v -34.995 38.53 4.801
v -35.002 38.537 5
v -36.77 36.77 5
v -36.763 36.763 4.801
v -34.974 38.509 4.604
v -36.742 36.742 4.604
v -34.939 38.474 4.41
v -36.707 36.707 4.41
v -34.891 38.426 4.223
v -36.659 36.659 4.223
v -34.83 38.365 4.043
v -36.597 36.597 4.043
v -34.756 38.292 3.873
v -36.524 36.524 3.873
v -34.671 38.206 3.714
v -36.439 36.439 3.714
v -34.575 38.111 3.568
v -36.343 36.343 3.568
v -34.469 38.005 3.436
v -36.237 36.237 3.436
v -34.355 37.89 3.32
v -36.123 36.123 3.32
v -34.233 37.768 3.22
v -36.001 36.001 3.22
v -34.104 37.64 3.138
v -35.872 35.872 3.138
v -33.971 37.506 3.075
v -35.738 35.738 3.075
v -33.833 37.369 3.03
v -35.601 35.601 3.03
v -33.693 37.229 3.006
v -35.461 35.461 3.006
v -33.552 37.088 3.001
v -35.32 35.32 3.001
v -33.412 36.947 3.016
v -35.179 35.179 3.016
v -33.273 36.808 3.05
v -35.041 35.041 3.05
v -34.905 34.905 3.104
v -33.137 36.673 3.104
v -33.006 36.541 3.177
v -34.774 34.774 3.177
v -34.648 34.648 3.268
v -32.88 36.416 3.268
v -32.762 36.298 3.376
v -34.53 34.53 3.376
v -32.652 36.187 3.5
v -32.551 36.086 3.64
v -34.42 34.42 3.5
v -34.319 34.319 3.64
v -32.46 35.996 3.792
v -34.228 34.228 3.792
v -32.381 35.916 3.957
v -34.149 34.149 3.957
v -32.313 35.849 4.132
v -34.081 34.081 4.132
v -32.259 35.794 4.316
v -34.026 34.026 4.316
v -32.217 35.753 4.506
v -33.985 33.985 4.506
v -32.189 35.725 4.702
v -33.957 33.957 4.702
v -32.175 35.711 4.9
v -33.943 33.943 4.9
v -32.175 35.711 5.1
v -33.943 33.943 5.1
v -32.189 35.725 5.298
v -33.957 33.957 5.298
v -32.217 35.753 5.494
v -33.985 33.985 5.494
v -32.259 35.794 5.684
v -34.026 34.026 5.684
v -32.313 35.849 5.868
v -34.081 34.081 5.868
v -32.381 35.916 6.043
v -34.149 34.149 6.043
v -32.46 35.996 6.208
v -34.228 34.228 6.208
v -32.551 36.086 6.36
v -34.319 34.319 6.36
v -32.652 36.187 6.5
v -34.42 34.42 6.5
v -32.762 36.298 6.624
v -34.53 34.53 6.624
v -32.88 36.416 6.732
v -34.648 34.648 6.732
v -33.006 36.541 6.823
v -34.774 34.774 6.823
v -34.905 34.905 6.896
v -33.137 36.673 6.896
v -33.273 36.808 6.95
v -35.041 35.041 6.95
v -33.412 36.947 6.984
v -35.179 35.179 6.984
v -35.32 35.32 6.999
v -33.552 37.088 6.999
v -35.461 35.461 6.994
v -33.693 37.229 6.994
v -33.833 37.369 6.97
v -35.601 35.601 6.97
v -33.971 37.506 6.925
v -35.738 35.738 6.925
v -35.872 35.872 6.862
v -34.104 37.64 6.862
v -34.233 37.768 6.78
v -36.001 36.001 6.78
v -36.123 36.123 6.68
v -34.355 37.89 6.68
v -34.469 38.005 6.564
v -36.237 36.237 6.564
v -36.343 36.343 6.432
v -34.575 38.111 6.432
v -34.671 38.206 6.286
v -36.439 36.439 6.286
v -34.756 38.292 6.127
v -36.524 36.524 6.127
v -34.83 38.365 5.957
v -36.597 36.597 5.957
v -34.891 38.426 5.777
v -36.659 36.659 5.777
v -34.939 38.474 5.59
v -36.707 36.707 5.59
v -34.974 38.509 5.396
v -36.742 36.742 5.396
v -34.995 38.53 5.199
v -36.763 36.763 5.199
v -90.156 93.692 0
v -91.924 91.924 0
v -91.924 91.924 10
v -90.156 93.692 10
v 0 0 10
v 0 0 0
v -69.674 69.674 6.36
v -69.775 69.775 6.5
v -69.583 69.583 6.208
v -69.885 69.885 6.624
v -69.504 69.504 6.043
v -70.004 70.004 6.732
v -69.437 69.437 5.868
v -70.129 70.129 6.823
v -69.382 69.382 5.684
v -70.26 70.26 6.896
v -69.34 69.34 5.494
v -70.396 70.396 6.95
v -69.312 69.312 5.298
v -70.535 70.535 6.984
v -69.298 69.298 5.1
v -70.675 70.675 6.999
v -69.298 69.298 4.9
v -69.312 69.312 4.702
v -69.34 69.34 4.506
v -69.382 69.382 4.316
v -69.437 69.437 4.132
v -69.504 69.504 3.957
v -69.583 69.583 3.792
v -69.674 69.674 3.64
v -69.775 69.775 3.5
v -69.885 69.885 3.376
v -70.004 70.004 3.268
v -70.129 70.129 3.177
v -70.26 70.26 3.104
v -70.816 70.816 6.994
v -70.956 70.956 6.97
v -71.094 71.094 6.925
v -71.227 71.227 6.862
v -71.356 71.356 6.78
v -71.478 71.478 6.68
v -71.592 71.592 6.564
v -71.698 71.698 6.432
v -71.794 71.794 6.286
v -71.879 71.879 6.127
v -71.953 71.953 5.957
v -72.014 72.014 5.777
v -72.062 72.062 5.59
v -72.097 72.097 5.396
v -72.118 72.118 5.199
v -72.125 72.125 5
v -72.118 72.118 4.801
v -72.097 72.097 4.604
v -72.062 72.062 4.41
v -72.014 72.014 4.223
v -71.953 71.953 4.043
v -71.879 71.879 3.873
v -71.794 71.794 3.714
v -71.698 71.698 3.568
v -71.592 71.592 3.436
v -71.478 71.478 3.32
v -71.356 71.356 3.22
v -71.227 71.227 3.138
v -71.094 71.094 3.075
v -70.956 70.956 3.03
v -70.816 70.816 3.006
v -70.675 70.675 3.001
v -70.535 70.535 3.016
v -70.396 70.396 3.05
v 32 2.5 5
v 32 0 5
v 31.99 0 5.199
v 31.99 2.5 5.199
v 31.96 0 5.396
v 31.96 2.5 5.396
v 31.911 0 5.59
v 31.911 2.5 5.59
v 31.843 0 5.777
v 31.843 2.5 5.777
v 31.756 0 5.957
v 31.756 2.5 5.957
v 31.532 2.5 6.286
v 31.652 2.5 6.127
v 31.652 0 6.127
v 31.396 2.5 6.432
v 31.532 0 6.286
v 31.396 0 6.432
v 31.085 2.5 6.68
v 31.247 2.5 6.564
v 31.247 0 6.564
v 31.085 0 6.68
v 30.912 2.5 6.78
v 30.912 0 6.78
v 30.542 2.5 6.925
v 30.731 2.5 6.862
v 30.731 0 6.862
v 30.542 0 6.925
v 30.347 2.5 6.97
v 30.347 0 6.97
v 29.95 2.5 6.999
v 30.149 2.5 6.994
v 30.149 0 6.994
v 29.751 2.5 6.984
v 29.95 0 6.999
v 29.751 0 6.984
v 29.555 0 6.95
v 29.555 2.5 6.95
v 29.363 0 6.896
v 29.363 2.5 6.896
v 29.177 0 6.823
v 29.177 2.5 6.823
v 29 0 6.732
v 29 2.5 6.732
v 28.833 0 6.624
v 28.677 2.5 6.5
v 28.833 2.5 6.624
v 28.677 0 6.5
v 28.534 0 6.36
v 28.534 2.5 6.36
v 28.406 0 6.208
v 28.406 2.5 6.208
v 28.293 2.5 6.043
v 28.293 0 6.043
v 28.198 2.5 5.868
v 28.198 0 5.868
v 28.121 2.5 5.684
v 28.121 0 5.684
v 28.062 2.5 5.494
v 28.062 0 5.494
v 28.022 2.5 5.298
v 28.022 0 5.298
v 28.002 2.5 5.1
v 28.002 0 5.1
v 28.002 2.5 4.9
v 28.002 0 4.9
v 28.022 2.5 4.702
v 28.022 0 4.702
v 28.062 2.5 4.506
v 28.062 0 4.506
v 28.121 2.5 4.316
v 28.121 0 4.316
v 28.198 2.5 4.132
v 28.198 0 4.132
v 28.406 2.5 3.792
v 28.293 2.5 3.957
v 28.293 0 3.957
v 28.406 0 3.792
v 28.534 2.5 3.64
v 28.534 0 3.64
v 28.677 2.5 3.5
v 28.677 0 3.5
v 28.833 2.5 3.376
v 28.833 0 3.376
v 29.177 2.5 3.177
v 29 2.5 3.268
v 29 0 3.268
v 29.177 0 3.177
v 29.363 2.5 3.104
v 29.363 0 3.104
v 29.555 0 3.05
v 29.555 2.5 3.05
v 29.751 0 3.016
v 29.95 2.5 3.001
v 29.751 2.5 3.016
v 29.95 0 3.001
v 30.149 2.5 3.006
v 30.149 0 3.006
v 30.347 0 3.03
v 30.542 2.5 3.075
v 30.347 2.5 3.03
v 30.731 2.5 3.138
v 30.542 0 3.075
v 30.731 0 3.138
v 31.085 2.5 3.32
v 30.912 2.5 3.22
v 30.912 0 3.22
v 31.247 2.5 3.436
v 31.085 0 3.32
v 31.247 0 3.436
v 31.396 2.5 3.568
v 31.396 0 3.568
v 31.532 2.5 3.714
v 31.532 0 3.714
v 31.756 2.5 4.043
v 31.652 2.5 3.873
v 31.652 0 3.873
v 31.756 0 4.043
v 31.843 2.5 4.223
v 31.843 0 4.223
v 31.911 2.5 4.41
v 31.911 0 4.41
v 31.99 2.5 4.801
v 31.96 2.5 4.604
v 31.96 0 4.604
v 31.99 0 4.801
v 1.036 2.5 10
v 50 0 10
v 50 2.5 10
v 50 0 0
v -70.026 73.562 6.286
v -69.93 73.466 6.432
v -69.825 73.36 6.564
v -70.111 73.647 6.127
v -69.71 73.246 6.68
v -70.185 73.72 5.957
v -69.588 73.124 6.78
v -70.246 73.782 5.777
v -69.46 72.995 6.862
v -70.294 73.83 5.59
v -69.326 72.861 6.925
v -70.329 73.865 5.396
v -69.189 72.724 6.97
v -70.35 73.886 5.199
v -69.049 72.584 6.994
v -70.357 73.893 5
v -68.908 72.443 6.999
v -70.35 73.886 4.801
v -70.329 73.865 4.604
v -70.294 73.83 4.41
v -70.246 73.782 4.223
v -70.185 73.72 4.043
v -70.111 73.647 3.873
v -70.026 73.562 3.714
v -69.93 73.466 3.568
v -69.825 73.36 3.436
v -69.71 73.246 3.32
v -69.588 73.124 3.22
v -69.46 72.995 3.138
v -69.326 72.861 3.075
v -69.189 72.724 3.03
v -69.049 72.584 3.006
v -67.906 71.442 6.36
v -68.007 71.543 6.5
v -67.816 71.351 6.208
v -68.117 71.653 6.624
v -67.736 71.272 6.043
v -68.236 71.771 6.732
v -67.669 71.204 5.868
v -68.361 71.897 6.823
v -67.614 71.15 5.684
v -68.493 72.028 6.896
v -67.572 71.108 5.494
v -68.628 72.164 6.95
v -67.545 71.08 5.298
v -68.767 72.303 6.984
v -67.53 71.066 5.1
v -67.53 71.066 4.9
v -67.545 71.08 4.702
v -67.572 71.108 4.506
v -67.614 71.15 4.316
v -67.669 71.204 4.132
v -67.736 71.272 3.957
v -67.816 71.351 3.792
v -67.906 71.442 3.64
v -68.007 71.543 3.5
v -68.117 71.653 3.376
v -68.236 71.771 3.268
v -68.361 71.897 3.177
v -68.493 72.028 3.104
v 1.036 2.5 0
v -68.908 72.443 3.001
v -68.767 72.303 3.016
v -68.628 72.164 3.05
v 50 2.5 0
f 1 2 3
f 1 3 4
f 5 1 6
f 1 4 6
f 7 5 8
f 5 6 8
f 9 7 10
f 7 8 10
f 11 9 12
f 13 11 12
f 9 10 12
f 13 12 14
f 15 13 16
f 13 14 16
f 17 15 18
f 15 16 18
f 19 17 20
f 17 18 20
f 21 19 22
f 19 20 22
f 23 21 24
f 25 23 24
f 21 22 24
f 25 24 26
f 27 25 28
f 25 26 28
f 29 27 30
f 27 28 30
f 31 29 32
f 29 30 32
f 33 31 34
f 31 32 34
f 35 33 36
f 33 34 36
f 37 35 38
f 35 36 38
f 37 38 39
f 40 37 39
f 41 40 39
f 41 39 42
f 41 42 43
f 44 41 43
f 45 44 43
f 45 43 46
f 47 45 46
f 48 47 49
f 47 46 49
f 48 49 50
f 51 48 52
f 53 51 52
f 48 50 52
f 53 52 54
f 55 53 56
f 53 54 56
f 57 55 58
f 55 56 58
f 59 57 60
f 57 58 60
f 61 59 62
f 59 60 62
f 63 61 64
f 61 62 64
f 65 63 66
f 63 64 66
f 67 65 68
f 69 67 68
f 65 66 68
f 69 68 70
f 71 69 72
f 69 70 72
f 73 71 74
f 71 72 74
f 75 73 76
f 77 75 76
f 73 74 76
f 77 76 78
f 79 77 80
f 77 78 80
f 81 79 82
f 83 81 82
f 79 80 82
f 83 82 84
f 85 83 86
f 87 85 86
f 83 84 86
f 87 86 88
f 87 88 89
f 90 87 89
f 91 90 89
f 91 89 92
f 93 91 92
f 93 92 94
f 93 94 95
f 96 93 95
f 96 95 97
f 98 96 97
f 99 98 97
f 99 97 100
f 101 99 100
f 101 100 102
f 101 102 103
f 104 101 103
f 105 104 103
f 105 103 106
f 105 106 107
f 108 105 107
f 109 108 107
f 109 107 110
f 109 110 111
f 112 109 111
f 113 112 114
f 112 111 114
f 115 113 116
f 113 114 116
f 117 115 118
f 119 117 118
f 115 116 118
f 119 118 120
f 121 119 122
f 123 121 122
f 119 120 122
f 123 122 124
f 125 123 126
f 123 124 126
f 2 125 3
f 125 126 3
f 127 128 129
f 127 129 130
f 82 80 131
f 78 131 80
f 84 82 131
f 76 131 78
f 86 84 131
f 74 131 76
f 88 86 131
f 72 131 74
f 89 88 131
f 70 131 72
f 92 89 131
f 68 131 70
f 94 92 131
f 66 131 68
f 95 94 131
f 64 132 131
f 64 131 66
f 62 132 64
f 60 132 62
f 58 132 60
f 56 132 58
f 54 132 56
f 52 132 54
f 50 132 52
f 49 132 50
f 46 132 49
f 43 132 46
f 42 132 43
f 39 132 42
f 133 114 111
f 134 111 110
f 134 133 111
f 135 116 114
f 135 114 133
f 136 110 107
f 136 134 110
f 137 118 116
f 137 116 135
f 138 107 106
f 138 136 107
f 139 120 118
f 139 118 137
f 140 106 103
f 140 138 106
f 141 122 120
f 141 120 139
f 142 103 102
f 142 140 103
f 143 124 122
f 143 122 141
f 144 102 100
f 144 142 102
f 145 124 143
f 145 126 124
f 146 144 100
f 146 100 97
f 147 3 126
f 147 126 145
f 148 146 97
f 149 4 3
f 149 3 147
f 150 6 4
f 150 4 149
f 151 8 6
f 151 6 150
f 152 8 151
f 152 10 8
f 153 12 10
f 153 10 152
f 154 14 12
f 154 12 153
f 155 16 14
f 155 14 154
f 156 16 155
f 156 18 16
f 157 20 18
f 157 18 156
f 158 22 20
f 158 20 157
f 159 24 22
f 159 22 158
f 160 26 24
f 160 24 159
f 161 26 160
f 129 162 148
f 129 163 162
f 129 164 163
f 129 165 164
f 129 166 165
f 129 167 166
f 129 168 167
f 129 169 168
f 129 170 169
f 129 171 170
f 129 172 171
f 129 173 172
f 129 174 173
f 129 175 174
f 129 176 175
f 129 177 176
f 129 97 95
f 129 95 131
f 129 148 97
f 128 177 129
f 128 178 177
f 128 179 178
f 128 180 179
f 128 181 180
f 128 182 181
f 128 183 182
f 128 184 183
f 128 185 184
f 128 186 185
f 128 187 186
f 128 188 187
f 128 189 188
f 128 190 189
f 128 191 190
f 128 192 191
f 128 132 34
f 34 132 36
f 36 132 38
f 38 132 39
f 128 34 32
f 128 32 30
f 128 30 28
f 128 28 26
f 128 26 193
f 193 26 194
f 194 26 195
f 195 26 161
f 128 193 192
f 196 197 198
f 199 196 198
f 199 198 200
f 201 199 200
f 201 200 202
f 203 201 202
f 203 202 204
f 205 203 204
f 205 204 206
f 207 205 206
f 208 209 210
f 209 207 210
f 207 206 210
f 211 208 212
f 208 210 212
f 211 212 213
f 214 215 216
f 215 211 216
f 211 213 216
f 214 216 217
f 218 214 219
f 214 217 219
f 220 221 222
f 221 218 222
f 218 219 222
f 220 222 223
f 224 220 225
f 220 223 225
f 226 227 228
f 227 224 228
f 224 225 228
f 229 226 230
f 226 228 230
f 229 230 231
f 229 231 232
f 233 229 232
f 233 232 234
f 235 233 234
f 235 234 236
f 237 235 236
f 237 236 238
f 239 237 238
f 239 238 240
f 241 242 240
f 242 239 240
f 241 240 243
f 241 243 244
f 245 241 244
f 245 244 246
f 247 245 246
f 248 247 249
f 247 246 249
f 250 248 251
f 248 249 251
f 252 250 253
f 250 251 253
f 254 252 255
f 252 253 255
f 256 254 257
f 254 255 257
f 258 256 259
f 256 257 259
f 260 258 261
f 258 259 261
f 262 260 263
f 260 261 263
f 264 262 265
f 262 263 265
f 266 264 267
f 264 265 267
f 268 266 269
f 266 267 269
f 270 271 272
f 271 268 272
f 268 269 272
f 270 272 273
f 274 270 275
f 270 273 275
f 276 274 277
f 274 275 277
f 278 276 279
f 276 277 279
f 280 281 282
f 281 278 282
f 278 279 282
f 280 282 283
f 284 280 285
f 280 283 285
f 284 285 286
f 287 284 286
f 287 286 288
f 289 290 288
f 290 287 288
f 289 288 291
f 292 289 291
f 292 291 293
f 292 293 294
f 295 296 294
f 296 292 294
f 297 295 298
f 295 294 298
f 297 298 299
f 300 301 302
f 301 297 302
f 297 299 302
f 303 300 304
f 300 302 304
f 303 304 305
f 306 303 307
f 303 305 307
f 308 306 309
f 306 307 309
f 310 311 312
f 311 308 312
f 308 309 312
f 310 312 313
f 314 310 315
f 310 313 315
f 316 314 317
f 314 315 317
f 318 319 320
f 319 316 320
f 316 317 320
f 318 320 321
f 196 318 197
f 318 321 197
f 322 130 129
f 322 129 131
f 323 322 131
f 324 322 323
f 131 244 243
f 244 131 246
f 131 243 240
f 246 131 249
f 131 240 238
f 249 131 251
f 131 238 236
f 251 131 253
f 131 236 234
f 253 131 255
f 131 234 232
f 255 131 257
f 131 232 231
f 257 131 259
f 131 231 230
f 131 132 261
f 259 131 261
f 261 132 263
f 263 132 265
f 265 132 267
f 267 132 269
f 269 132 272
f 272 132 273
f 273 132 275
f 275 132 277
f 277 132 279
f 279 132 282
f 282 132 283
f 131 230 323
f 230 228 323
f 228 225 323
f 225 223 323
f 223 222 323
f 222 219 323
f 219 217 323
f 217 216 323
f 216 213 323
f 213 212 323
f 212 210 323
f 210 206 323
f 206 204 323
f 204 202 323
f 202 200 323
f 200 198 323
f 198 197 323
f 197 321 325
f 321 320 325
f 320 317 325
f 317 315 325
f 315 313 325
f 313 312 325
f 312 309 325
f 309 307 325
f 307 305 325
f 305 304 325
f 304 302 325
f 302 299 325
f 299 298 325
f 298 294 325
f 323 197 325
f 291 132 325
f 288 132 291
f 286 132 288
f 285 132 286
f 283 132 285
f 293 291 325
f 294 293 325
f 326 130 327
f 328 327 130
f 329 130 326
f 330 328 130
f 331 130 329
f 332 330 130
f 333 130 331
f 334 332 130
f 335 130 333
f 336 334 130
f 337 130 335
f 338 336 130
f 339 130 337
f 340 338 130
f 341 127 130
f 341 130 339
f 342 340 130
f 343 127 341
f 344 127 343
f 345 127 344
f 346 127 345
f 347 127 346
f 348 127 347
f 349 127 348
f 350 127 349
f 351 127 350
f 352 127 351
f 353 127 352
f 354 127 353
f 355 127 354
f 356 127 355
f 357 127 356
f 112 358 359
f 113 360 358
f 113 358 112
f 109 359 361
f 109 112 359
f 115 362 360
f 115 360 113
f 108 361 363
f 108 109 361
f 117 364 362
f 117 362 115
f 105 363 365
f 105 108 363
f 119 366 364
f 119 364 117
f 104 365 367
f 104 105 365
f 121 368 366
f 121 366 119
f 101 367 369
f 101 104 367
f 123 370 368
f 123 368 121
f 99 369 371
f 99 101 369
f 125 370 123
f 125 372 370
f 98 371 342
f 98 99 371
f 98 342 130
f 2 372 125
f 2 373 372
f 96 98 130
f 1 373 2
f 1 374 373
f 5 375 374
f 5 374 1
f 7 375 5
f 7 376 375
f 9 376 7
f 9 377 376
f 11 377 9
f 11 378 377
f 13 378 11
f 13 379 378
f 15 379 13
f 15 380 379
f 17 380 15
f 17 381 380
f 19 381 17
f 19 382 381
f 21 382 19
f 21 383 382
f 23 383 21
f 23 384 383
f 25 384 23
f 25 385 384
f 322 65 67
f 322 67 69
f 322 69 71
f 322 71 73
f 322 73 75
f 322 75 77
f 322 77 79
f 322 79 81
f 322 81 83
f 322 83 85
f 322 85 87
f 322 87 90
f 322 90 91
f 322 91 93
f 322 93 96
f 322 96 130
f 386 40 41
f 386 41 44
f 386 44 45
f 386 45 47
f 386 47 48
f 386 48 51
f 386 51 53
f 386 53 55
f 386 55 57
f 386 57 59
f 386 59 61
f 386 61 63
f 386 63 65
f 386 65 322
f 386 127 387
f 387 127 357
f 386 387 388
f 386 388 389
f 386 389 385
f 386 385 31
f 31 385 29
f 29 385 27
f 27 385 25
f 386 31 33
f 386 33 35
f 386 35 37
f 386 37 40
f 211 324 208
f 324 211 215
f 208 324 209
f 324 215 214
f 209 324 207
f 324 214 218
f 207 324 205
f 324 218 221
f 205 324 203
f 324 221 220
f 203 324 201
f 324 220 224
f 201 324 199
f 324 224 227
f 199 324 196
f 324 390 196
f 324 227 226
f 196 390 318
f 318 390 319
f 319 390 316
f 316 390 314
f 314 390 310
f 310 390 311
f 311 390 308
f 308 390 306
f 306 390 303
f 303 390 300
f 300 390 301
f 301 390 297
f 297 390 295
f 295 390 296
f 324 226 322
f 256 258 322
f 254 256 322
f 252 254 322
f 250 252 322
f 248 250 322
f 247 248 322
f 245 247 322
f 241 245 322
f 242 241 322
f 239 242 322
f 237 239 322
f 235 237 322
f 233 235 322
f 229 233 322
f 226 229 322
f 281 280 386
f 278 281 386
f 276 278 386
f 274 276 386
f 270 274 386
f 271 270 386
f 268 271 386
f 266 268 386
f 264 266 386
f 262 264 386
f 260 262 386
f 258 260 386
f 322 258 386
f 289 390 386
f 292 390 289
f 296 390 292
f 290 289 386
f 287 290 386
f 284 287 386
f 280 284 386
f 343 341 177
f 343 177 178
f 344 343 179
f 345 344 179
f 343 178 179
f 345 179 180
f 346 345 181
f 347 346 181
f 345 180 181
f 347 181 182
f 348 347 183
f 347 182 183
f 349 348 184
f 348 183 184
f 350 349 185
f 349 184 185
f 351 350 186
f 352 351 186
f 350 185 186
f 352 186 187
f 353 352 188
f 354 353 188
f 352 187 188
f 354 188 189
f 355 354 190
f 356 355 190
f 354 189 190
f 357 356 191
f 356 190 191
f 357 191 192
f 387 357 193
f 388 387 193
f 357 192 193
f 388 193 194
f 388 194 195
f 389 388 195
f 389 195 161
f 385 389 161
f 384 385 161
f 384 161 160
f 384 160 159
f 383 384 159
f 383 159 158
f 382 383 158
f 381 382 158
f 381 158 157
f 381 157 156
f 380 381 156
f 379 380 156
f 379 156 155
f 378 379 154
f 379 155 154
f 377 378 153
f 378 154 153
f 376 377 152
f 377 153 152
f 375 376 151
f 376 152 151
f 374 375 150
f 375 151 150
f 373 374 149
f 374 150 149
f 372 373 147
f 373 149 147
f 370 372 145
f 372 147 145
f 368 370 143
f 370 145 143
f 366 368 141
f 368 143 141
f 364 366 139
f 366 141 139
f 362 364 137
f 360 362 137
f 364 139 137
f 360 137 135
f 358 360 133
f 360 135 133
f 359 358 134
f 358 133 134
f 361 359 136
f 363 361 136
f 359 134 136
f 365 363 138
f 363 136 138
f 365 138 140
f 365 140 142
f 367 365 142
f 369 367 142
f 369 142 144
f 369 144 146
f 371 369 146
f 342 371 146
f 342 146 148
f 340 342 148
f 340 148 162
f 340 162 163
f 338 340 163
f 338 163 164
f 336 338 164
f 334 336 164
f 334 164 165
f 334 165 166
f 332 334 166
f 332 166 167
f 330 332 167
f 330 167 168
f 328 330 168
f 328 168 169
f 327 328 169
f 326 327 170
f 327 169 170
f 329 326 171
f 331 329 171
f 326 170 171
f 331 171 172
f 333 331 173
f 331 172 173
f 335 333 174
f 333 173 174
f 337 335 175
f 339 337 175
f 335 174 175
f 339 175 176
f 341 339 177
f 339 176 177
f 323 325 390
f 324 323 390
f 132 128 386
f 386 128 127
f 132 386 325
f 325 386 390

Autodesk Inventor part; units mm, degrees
ref_plane "YZ Plane" through (0, 0, 0) normal (1, 0, 0) x (0, 1, 0)
ref_plane "XZ Plane" through (0, 0, 0) normal (0, 1, 0) x (-1, 0, 0)
ref_plane "XY Plane" through (0, 0, 0) normal (0, 0, 1) x (1, 0, 0)
sketch "Sketch1" plane through (0, 0, 0) normal (0, 0, 1) x (1, 0, 0)
  line L0 (0, 0) -> (50, 0)
  line L1 (0, 0) -> (-91.9239, 91.9239)
  line L2 (0, 0) -> (130, 0) construction
  line L3 (-91.9239, 91.9239) -> (-90.1561, 93.6916)
  line L4 (-91.9239, 91.9239) -> (-89.4239, 91.9239) construction
  line L5 (-90.1561, 93.6916) -> (1.0355, 2.5)
  line L6 (50, 0) -> (50, 2.5)
  line L7 (50, 2.5) -> (1.0355, 2.5)
  dimension "d0" = 50
  dimension "d1" = 130
  dimension "d2" = 135
  dimension "d3" = 2.5
  dimension "d4" = 45
  dimension "d5" = 90
  dimension "d6" = 2.5
extrude "Extrusion1" add sketch "Sketch1" along normal blind 10
sketch "Sketch2" plane through (0, 0, 0) normal (0, -1, 0) x (1, 0, 0)
  line L0 (0, 0) -> (0, 10) projected
  line L1 (0, 5) -> (30, 5)
  circle A0 centre (30, 5) radius 2
  dimension "d9" = 30
  dimension "d10" = 4
extrude "Extrusion2" cut sketch "Sketch2" against normal blind 10
sketch "Sketch3" plane through (0, 0, 10) normal (-0.7071, -0.7071, 0) x (-0.7071, 0.7071, 0)
  line L0 (0, 10) -> (0, 0) projected
  line L1 (0, 5) -> (50, 5)
  line L2 (0, 5) -> (50, 5) construction
  line L3 (50, 5) -> (100, 5)
  line L4 (50, 5) -> (100, 5) construction
  circle A0 centre (100, 5) radius 2
  circle A1 centre (50, 5) radius 2
  dimension "d13" = 50
  dimension "d14" = 0
  dimension "d15" = 50
  dimension "d16" = 0
  dimension "d17" = 4
  dimension "d18" = 4
extrude "Extrusion3" cut sketch "Sketch3" against normal blind 10
properties part number "ChassisClamp"
